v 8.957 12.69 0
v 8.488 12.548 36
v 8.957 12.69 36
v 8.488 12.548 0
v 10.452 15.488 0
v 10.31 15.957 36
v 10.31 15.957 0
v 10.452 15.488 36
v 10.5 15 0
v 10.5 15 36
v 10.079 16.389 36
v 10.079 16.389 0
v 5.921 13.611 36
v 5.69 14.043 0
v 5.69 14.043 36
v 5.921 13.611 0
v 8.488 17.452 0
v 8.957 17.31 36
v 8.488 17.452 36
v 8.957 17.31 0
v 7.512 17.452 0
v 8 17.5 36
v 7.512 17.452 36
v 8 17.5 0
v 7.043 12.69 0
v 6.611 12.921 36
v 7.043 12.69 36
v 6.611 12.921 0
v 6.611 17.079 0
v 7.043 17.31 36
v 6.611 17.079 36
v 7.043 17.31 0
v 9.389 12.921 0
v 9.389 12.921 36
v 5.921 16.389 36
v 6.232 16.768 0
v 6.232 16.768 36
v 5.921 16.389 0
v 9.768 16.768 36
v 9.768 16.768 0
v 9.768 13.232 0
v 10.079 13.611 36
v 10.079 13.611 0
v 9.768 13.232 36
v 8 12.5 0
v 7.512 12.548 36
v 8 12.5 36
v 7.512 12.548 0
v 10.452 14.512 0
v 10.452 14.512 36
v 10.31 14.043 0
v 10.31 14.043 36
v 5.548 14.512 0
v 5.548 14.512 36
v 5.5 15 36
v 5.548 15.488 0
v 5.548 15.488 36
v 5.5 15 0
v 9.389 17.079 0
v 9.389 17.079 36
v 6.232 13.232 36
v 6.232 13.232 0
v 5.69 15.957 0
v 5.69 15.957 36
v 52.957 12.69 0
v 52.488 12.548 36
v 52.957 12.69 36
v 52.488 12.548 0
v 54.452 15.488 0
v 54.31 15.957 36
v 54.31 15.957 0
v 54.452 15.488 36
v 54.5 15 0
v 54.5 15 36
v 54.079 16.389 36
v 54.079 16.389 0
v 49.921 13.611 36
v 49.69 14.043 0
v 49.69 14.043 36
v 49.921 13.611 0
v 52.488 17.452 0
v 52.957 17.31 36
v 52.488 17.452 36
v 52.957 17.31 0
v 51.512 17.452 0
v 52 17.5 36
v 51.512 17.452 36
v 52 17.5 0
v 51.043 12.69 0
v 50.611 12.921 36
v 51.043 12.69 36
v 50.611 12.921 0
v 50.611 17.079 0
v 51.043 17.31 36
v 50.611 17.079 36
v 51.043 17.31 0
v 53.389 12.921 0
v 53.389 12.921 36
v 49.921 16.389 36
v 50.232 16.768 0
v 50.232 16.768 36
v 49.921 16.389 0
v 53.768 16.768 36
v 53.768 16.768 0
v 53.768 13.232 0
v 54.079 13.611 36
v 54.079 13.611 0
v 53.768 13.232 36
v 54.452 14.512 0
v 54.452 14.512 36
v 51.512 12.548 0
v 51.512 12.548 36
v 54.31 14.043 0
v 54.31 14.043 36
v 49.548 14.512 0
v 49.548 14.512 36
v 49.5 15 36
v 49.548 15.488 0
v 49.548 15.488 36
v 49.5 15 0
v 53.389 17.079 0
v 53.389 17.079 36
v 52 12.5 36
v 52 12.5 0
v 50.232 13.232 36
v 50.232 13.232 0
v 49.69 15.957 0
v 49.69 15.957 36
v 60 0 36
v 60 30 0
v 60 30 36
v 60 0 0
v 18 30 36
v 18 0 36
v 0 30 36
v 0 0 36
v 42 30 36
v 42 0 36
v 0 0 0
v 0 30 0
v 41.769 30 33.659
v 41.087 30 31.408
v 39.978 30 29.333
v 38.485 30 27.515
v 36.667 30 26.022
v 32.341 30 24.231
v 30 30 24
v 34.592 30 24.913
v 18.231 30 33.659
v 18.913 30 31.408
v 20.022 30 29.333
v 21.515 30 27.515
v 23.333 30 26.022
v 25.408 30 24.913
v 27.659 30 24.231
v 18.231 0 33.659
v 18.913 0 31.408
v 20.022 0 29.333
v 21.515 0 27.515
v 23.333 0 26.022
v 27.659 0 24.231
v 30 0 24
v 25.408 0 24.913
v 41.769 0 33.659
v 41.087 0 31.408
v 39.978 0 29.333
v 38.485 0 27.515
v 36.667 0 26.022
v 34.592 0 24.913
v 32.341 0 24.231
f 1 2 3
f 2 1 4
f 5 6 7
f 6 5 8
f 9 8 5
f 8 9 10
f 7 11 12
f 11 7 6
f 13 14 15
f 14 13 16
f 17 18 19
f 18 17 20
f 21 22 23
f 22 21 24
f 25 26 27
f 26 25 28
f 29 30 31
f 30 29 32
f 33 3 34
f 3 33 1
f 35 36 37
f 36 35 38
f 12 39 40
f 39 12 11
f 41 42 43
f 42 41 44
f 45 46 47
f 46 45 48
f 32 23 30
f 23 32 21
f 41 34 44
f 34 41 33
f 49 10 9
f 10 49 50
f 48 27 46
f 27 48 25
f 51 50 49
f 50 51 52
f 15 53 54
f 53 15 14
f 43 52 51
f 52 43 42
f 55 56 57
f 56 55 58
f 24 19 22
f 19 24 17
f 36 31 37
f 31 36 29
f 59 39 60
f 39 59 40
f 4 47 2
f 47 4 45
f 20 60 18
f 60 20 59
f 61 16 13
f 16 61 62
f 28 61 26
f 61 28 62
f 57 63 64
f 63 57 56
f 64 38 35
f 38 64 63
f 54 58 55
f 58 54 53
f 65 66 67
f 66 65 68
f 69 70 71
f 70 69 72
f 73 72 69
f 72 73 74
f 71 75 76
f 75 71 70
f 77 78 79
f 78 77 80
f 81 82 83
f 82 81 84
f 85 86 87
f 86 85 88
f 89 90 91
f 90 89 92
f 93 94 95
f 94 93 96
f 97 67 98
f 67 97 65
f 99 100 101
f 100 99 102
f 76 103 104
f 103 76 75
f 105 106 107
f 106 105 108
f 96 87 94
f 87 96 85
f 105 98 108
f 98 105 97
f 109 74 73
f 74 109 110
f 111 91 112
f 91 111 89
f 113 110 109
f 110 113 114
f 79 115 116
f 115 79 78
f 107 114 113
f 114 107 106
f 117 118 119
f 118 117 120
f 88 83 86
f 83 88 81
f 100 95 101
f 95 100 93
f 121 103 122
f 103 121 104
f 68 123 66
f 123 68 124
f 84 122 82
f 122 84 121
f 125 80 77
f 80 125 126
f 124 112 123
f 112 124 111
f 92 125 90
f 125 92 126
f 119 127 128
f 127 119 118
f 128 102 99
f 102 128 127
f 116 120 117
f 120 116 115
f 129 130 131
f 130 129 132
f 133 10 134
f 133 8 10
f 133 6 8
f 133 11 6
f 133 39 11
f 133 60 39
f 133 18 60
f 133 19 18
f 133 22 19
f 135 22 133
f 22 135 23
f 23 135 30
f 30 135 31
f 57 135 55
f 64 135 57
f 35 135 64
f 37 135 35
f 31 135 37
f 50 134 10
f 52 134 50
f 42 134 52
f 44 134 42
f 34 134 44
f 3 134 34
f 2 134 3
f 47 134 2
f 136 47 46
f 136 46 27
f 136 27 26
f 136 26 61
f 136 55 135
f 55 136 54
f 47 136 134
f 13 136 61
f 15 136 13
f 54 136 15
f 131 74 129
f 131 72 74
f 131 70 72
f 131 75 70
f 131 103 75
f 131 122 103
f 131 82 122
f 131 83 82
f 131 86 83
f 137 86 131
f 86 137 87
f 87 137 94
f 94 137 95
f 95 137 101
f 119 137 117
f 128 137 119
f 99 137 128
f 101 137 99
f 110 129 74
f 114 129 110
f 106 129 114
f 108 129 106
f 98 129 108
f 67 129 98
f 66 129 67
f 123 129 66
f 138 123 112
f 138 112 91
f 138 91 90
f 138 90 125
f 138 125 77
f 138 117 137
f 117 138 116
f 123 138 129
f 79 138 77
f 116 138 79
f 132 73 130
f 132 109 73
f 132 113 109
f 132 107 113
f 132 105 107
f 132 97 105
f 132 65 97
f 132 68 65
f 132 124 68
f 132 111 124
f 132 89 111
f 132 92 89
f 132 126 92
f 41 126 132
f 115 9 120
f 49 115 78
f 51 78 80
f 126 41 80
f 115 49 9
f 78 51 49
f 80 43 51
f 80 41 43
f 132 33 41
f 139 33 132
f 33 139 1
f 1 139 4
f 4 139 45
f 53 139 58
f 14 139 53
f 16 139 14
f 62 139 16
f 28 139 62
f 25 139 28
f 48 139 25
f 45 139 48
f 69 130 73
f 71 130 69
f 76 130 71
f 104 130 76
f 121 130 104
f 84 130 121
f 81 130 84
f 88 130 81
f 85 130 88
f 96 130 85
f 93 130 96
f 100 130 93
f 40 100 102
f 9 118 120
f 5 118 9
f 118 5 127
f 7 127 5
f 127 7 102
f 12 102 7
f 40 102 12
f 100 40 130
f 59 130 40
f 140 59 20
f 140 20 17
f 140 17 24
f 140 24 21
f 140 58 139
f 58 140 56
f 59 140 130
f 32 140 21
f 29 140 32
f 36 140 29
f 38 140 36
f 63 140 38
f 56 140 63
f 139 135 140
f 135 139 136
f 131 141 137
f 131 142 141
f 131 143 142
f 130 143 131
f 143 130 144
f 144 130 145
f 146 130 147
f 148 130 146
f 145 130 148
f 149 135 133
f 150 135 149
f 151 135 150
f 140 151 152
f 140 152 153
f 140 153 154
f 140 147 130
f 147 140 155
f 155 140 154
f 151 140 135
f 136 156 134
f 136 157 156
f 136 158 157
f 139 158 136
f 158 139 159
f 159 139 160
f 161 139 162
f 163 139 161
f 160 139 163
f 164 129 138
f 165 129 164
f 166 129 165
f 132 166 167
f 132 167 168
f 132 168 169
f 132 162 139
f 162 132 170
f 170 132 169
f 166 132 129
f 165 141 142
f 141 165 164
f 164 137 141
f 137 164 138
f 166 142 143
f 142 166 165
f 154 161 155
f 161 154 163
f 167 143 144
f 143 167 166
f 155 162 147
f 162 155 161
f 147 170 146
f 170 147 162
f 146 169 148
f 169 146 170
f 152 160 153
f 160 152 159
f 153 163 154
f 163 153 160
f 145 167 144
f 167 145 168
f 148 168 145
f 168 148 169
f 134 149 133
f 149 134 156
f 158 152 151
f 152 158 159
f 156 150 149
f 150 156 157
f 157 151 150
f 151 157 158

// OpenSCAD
$fn = 32;

// ----------------------------------------------------------------------
// Saddle clamp: plain shaft clamp
// ----------------------------------------------------------------------

// --- parameters (mm) ---
blk_l = 60;               // block length, X
blk_w = 30;               // block width, Y
blk_h = 36;               // block height
clamp_r = 12;             // shaft groove radius
hole_r = 2.5;             // bolt hole radius
hole_m = 8;               // bolt hole margin from the ends
fit_tol = 0.05;           // tolerance for press fits, mm
free_tol = 0.2;           // tolerance for clearance fits, mm

saw_depth = clamp_r + 3;  // saw kerf depth

difference() {
  cube([blk_l, blk_w, blk_h]);
  translate([blk_l / 2, -1, blk_h])
    rotate([-90, 0, 0])
      cylinder(h = blk_w + 2, r = clamp_r);
  for (sx = [0, 1])
    translate([sx ? blk_l - hole_m : hole_m, blk_w / 2, -1])
      cylinder(r = hole_r, h = blk_h + 2);
}
